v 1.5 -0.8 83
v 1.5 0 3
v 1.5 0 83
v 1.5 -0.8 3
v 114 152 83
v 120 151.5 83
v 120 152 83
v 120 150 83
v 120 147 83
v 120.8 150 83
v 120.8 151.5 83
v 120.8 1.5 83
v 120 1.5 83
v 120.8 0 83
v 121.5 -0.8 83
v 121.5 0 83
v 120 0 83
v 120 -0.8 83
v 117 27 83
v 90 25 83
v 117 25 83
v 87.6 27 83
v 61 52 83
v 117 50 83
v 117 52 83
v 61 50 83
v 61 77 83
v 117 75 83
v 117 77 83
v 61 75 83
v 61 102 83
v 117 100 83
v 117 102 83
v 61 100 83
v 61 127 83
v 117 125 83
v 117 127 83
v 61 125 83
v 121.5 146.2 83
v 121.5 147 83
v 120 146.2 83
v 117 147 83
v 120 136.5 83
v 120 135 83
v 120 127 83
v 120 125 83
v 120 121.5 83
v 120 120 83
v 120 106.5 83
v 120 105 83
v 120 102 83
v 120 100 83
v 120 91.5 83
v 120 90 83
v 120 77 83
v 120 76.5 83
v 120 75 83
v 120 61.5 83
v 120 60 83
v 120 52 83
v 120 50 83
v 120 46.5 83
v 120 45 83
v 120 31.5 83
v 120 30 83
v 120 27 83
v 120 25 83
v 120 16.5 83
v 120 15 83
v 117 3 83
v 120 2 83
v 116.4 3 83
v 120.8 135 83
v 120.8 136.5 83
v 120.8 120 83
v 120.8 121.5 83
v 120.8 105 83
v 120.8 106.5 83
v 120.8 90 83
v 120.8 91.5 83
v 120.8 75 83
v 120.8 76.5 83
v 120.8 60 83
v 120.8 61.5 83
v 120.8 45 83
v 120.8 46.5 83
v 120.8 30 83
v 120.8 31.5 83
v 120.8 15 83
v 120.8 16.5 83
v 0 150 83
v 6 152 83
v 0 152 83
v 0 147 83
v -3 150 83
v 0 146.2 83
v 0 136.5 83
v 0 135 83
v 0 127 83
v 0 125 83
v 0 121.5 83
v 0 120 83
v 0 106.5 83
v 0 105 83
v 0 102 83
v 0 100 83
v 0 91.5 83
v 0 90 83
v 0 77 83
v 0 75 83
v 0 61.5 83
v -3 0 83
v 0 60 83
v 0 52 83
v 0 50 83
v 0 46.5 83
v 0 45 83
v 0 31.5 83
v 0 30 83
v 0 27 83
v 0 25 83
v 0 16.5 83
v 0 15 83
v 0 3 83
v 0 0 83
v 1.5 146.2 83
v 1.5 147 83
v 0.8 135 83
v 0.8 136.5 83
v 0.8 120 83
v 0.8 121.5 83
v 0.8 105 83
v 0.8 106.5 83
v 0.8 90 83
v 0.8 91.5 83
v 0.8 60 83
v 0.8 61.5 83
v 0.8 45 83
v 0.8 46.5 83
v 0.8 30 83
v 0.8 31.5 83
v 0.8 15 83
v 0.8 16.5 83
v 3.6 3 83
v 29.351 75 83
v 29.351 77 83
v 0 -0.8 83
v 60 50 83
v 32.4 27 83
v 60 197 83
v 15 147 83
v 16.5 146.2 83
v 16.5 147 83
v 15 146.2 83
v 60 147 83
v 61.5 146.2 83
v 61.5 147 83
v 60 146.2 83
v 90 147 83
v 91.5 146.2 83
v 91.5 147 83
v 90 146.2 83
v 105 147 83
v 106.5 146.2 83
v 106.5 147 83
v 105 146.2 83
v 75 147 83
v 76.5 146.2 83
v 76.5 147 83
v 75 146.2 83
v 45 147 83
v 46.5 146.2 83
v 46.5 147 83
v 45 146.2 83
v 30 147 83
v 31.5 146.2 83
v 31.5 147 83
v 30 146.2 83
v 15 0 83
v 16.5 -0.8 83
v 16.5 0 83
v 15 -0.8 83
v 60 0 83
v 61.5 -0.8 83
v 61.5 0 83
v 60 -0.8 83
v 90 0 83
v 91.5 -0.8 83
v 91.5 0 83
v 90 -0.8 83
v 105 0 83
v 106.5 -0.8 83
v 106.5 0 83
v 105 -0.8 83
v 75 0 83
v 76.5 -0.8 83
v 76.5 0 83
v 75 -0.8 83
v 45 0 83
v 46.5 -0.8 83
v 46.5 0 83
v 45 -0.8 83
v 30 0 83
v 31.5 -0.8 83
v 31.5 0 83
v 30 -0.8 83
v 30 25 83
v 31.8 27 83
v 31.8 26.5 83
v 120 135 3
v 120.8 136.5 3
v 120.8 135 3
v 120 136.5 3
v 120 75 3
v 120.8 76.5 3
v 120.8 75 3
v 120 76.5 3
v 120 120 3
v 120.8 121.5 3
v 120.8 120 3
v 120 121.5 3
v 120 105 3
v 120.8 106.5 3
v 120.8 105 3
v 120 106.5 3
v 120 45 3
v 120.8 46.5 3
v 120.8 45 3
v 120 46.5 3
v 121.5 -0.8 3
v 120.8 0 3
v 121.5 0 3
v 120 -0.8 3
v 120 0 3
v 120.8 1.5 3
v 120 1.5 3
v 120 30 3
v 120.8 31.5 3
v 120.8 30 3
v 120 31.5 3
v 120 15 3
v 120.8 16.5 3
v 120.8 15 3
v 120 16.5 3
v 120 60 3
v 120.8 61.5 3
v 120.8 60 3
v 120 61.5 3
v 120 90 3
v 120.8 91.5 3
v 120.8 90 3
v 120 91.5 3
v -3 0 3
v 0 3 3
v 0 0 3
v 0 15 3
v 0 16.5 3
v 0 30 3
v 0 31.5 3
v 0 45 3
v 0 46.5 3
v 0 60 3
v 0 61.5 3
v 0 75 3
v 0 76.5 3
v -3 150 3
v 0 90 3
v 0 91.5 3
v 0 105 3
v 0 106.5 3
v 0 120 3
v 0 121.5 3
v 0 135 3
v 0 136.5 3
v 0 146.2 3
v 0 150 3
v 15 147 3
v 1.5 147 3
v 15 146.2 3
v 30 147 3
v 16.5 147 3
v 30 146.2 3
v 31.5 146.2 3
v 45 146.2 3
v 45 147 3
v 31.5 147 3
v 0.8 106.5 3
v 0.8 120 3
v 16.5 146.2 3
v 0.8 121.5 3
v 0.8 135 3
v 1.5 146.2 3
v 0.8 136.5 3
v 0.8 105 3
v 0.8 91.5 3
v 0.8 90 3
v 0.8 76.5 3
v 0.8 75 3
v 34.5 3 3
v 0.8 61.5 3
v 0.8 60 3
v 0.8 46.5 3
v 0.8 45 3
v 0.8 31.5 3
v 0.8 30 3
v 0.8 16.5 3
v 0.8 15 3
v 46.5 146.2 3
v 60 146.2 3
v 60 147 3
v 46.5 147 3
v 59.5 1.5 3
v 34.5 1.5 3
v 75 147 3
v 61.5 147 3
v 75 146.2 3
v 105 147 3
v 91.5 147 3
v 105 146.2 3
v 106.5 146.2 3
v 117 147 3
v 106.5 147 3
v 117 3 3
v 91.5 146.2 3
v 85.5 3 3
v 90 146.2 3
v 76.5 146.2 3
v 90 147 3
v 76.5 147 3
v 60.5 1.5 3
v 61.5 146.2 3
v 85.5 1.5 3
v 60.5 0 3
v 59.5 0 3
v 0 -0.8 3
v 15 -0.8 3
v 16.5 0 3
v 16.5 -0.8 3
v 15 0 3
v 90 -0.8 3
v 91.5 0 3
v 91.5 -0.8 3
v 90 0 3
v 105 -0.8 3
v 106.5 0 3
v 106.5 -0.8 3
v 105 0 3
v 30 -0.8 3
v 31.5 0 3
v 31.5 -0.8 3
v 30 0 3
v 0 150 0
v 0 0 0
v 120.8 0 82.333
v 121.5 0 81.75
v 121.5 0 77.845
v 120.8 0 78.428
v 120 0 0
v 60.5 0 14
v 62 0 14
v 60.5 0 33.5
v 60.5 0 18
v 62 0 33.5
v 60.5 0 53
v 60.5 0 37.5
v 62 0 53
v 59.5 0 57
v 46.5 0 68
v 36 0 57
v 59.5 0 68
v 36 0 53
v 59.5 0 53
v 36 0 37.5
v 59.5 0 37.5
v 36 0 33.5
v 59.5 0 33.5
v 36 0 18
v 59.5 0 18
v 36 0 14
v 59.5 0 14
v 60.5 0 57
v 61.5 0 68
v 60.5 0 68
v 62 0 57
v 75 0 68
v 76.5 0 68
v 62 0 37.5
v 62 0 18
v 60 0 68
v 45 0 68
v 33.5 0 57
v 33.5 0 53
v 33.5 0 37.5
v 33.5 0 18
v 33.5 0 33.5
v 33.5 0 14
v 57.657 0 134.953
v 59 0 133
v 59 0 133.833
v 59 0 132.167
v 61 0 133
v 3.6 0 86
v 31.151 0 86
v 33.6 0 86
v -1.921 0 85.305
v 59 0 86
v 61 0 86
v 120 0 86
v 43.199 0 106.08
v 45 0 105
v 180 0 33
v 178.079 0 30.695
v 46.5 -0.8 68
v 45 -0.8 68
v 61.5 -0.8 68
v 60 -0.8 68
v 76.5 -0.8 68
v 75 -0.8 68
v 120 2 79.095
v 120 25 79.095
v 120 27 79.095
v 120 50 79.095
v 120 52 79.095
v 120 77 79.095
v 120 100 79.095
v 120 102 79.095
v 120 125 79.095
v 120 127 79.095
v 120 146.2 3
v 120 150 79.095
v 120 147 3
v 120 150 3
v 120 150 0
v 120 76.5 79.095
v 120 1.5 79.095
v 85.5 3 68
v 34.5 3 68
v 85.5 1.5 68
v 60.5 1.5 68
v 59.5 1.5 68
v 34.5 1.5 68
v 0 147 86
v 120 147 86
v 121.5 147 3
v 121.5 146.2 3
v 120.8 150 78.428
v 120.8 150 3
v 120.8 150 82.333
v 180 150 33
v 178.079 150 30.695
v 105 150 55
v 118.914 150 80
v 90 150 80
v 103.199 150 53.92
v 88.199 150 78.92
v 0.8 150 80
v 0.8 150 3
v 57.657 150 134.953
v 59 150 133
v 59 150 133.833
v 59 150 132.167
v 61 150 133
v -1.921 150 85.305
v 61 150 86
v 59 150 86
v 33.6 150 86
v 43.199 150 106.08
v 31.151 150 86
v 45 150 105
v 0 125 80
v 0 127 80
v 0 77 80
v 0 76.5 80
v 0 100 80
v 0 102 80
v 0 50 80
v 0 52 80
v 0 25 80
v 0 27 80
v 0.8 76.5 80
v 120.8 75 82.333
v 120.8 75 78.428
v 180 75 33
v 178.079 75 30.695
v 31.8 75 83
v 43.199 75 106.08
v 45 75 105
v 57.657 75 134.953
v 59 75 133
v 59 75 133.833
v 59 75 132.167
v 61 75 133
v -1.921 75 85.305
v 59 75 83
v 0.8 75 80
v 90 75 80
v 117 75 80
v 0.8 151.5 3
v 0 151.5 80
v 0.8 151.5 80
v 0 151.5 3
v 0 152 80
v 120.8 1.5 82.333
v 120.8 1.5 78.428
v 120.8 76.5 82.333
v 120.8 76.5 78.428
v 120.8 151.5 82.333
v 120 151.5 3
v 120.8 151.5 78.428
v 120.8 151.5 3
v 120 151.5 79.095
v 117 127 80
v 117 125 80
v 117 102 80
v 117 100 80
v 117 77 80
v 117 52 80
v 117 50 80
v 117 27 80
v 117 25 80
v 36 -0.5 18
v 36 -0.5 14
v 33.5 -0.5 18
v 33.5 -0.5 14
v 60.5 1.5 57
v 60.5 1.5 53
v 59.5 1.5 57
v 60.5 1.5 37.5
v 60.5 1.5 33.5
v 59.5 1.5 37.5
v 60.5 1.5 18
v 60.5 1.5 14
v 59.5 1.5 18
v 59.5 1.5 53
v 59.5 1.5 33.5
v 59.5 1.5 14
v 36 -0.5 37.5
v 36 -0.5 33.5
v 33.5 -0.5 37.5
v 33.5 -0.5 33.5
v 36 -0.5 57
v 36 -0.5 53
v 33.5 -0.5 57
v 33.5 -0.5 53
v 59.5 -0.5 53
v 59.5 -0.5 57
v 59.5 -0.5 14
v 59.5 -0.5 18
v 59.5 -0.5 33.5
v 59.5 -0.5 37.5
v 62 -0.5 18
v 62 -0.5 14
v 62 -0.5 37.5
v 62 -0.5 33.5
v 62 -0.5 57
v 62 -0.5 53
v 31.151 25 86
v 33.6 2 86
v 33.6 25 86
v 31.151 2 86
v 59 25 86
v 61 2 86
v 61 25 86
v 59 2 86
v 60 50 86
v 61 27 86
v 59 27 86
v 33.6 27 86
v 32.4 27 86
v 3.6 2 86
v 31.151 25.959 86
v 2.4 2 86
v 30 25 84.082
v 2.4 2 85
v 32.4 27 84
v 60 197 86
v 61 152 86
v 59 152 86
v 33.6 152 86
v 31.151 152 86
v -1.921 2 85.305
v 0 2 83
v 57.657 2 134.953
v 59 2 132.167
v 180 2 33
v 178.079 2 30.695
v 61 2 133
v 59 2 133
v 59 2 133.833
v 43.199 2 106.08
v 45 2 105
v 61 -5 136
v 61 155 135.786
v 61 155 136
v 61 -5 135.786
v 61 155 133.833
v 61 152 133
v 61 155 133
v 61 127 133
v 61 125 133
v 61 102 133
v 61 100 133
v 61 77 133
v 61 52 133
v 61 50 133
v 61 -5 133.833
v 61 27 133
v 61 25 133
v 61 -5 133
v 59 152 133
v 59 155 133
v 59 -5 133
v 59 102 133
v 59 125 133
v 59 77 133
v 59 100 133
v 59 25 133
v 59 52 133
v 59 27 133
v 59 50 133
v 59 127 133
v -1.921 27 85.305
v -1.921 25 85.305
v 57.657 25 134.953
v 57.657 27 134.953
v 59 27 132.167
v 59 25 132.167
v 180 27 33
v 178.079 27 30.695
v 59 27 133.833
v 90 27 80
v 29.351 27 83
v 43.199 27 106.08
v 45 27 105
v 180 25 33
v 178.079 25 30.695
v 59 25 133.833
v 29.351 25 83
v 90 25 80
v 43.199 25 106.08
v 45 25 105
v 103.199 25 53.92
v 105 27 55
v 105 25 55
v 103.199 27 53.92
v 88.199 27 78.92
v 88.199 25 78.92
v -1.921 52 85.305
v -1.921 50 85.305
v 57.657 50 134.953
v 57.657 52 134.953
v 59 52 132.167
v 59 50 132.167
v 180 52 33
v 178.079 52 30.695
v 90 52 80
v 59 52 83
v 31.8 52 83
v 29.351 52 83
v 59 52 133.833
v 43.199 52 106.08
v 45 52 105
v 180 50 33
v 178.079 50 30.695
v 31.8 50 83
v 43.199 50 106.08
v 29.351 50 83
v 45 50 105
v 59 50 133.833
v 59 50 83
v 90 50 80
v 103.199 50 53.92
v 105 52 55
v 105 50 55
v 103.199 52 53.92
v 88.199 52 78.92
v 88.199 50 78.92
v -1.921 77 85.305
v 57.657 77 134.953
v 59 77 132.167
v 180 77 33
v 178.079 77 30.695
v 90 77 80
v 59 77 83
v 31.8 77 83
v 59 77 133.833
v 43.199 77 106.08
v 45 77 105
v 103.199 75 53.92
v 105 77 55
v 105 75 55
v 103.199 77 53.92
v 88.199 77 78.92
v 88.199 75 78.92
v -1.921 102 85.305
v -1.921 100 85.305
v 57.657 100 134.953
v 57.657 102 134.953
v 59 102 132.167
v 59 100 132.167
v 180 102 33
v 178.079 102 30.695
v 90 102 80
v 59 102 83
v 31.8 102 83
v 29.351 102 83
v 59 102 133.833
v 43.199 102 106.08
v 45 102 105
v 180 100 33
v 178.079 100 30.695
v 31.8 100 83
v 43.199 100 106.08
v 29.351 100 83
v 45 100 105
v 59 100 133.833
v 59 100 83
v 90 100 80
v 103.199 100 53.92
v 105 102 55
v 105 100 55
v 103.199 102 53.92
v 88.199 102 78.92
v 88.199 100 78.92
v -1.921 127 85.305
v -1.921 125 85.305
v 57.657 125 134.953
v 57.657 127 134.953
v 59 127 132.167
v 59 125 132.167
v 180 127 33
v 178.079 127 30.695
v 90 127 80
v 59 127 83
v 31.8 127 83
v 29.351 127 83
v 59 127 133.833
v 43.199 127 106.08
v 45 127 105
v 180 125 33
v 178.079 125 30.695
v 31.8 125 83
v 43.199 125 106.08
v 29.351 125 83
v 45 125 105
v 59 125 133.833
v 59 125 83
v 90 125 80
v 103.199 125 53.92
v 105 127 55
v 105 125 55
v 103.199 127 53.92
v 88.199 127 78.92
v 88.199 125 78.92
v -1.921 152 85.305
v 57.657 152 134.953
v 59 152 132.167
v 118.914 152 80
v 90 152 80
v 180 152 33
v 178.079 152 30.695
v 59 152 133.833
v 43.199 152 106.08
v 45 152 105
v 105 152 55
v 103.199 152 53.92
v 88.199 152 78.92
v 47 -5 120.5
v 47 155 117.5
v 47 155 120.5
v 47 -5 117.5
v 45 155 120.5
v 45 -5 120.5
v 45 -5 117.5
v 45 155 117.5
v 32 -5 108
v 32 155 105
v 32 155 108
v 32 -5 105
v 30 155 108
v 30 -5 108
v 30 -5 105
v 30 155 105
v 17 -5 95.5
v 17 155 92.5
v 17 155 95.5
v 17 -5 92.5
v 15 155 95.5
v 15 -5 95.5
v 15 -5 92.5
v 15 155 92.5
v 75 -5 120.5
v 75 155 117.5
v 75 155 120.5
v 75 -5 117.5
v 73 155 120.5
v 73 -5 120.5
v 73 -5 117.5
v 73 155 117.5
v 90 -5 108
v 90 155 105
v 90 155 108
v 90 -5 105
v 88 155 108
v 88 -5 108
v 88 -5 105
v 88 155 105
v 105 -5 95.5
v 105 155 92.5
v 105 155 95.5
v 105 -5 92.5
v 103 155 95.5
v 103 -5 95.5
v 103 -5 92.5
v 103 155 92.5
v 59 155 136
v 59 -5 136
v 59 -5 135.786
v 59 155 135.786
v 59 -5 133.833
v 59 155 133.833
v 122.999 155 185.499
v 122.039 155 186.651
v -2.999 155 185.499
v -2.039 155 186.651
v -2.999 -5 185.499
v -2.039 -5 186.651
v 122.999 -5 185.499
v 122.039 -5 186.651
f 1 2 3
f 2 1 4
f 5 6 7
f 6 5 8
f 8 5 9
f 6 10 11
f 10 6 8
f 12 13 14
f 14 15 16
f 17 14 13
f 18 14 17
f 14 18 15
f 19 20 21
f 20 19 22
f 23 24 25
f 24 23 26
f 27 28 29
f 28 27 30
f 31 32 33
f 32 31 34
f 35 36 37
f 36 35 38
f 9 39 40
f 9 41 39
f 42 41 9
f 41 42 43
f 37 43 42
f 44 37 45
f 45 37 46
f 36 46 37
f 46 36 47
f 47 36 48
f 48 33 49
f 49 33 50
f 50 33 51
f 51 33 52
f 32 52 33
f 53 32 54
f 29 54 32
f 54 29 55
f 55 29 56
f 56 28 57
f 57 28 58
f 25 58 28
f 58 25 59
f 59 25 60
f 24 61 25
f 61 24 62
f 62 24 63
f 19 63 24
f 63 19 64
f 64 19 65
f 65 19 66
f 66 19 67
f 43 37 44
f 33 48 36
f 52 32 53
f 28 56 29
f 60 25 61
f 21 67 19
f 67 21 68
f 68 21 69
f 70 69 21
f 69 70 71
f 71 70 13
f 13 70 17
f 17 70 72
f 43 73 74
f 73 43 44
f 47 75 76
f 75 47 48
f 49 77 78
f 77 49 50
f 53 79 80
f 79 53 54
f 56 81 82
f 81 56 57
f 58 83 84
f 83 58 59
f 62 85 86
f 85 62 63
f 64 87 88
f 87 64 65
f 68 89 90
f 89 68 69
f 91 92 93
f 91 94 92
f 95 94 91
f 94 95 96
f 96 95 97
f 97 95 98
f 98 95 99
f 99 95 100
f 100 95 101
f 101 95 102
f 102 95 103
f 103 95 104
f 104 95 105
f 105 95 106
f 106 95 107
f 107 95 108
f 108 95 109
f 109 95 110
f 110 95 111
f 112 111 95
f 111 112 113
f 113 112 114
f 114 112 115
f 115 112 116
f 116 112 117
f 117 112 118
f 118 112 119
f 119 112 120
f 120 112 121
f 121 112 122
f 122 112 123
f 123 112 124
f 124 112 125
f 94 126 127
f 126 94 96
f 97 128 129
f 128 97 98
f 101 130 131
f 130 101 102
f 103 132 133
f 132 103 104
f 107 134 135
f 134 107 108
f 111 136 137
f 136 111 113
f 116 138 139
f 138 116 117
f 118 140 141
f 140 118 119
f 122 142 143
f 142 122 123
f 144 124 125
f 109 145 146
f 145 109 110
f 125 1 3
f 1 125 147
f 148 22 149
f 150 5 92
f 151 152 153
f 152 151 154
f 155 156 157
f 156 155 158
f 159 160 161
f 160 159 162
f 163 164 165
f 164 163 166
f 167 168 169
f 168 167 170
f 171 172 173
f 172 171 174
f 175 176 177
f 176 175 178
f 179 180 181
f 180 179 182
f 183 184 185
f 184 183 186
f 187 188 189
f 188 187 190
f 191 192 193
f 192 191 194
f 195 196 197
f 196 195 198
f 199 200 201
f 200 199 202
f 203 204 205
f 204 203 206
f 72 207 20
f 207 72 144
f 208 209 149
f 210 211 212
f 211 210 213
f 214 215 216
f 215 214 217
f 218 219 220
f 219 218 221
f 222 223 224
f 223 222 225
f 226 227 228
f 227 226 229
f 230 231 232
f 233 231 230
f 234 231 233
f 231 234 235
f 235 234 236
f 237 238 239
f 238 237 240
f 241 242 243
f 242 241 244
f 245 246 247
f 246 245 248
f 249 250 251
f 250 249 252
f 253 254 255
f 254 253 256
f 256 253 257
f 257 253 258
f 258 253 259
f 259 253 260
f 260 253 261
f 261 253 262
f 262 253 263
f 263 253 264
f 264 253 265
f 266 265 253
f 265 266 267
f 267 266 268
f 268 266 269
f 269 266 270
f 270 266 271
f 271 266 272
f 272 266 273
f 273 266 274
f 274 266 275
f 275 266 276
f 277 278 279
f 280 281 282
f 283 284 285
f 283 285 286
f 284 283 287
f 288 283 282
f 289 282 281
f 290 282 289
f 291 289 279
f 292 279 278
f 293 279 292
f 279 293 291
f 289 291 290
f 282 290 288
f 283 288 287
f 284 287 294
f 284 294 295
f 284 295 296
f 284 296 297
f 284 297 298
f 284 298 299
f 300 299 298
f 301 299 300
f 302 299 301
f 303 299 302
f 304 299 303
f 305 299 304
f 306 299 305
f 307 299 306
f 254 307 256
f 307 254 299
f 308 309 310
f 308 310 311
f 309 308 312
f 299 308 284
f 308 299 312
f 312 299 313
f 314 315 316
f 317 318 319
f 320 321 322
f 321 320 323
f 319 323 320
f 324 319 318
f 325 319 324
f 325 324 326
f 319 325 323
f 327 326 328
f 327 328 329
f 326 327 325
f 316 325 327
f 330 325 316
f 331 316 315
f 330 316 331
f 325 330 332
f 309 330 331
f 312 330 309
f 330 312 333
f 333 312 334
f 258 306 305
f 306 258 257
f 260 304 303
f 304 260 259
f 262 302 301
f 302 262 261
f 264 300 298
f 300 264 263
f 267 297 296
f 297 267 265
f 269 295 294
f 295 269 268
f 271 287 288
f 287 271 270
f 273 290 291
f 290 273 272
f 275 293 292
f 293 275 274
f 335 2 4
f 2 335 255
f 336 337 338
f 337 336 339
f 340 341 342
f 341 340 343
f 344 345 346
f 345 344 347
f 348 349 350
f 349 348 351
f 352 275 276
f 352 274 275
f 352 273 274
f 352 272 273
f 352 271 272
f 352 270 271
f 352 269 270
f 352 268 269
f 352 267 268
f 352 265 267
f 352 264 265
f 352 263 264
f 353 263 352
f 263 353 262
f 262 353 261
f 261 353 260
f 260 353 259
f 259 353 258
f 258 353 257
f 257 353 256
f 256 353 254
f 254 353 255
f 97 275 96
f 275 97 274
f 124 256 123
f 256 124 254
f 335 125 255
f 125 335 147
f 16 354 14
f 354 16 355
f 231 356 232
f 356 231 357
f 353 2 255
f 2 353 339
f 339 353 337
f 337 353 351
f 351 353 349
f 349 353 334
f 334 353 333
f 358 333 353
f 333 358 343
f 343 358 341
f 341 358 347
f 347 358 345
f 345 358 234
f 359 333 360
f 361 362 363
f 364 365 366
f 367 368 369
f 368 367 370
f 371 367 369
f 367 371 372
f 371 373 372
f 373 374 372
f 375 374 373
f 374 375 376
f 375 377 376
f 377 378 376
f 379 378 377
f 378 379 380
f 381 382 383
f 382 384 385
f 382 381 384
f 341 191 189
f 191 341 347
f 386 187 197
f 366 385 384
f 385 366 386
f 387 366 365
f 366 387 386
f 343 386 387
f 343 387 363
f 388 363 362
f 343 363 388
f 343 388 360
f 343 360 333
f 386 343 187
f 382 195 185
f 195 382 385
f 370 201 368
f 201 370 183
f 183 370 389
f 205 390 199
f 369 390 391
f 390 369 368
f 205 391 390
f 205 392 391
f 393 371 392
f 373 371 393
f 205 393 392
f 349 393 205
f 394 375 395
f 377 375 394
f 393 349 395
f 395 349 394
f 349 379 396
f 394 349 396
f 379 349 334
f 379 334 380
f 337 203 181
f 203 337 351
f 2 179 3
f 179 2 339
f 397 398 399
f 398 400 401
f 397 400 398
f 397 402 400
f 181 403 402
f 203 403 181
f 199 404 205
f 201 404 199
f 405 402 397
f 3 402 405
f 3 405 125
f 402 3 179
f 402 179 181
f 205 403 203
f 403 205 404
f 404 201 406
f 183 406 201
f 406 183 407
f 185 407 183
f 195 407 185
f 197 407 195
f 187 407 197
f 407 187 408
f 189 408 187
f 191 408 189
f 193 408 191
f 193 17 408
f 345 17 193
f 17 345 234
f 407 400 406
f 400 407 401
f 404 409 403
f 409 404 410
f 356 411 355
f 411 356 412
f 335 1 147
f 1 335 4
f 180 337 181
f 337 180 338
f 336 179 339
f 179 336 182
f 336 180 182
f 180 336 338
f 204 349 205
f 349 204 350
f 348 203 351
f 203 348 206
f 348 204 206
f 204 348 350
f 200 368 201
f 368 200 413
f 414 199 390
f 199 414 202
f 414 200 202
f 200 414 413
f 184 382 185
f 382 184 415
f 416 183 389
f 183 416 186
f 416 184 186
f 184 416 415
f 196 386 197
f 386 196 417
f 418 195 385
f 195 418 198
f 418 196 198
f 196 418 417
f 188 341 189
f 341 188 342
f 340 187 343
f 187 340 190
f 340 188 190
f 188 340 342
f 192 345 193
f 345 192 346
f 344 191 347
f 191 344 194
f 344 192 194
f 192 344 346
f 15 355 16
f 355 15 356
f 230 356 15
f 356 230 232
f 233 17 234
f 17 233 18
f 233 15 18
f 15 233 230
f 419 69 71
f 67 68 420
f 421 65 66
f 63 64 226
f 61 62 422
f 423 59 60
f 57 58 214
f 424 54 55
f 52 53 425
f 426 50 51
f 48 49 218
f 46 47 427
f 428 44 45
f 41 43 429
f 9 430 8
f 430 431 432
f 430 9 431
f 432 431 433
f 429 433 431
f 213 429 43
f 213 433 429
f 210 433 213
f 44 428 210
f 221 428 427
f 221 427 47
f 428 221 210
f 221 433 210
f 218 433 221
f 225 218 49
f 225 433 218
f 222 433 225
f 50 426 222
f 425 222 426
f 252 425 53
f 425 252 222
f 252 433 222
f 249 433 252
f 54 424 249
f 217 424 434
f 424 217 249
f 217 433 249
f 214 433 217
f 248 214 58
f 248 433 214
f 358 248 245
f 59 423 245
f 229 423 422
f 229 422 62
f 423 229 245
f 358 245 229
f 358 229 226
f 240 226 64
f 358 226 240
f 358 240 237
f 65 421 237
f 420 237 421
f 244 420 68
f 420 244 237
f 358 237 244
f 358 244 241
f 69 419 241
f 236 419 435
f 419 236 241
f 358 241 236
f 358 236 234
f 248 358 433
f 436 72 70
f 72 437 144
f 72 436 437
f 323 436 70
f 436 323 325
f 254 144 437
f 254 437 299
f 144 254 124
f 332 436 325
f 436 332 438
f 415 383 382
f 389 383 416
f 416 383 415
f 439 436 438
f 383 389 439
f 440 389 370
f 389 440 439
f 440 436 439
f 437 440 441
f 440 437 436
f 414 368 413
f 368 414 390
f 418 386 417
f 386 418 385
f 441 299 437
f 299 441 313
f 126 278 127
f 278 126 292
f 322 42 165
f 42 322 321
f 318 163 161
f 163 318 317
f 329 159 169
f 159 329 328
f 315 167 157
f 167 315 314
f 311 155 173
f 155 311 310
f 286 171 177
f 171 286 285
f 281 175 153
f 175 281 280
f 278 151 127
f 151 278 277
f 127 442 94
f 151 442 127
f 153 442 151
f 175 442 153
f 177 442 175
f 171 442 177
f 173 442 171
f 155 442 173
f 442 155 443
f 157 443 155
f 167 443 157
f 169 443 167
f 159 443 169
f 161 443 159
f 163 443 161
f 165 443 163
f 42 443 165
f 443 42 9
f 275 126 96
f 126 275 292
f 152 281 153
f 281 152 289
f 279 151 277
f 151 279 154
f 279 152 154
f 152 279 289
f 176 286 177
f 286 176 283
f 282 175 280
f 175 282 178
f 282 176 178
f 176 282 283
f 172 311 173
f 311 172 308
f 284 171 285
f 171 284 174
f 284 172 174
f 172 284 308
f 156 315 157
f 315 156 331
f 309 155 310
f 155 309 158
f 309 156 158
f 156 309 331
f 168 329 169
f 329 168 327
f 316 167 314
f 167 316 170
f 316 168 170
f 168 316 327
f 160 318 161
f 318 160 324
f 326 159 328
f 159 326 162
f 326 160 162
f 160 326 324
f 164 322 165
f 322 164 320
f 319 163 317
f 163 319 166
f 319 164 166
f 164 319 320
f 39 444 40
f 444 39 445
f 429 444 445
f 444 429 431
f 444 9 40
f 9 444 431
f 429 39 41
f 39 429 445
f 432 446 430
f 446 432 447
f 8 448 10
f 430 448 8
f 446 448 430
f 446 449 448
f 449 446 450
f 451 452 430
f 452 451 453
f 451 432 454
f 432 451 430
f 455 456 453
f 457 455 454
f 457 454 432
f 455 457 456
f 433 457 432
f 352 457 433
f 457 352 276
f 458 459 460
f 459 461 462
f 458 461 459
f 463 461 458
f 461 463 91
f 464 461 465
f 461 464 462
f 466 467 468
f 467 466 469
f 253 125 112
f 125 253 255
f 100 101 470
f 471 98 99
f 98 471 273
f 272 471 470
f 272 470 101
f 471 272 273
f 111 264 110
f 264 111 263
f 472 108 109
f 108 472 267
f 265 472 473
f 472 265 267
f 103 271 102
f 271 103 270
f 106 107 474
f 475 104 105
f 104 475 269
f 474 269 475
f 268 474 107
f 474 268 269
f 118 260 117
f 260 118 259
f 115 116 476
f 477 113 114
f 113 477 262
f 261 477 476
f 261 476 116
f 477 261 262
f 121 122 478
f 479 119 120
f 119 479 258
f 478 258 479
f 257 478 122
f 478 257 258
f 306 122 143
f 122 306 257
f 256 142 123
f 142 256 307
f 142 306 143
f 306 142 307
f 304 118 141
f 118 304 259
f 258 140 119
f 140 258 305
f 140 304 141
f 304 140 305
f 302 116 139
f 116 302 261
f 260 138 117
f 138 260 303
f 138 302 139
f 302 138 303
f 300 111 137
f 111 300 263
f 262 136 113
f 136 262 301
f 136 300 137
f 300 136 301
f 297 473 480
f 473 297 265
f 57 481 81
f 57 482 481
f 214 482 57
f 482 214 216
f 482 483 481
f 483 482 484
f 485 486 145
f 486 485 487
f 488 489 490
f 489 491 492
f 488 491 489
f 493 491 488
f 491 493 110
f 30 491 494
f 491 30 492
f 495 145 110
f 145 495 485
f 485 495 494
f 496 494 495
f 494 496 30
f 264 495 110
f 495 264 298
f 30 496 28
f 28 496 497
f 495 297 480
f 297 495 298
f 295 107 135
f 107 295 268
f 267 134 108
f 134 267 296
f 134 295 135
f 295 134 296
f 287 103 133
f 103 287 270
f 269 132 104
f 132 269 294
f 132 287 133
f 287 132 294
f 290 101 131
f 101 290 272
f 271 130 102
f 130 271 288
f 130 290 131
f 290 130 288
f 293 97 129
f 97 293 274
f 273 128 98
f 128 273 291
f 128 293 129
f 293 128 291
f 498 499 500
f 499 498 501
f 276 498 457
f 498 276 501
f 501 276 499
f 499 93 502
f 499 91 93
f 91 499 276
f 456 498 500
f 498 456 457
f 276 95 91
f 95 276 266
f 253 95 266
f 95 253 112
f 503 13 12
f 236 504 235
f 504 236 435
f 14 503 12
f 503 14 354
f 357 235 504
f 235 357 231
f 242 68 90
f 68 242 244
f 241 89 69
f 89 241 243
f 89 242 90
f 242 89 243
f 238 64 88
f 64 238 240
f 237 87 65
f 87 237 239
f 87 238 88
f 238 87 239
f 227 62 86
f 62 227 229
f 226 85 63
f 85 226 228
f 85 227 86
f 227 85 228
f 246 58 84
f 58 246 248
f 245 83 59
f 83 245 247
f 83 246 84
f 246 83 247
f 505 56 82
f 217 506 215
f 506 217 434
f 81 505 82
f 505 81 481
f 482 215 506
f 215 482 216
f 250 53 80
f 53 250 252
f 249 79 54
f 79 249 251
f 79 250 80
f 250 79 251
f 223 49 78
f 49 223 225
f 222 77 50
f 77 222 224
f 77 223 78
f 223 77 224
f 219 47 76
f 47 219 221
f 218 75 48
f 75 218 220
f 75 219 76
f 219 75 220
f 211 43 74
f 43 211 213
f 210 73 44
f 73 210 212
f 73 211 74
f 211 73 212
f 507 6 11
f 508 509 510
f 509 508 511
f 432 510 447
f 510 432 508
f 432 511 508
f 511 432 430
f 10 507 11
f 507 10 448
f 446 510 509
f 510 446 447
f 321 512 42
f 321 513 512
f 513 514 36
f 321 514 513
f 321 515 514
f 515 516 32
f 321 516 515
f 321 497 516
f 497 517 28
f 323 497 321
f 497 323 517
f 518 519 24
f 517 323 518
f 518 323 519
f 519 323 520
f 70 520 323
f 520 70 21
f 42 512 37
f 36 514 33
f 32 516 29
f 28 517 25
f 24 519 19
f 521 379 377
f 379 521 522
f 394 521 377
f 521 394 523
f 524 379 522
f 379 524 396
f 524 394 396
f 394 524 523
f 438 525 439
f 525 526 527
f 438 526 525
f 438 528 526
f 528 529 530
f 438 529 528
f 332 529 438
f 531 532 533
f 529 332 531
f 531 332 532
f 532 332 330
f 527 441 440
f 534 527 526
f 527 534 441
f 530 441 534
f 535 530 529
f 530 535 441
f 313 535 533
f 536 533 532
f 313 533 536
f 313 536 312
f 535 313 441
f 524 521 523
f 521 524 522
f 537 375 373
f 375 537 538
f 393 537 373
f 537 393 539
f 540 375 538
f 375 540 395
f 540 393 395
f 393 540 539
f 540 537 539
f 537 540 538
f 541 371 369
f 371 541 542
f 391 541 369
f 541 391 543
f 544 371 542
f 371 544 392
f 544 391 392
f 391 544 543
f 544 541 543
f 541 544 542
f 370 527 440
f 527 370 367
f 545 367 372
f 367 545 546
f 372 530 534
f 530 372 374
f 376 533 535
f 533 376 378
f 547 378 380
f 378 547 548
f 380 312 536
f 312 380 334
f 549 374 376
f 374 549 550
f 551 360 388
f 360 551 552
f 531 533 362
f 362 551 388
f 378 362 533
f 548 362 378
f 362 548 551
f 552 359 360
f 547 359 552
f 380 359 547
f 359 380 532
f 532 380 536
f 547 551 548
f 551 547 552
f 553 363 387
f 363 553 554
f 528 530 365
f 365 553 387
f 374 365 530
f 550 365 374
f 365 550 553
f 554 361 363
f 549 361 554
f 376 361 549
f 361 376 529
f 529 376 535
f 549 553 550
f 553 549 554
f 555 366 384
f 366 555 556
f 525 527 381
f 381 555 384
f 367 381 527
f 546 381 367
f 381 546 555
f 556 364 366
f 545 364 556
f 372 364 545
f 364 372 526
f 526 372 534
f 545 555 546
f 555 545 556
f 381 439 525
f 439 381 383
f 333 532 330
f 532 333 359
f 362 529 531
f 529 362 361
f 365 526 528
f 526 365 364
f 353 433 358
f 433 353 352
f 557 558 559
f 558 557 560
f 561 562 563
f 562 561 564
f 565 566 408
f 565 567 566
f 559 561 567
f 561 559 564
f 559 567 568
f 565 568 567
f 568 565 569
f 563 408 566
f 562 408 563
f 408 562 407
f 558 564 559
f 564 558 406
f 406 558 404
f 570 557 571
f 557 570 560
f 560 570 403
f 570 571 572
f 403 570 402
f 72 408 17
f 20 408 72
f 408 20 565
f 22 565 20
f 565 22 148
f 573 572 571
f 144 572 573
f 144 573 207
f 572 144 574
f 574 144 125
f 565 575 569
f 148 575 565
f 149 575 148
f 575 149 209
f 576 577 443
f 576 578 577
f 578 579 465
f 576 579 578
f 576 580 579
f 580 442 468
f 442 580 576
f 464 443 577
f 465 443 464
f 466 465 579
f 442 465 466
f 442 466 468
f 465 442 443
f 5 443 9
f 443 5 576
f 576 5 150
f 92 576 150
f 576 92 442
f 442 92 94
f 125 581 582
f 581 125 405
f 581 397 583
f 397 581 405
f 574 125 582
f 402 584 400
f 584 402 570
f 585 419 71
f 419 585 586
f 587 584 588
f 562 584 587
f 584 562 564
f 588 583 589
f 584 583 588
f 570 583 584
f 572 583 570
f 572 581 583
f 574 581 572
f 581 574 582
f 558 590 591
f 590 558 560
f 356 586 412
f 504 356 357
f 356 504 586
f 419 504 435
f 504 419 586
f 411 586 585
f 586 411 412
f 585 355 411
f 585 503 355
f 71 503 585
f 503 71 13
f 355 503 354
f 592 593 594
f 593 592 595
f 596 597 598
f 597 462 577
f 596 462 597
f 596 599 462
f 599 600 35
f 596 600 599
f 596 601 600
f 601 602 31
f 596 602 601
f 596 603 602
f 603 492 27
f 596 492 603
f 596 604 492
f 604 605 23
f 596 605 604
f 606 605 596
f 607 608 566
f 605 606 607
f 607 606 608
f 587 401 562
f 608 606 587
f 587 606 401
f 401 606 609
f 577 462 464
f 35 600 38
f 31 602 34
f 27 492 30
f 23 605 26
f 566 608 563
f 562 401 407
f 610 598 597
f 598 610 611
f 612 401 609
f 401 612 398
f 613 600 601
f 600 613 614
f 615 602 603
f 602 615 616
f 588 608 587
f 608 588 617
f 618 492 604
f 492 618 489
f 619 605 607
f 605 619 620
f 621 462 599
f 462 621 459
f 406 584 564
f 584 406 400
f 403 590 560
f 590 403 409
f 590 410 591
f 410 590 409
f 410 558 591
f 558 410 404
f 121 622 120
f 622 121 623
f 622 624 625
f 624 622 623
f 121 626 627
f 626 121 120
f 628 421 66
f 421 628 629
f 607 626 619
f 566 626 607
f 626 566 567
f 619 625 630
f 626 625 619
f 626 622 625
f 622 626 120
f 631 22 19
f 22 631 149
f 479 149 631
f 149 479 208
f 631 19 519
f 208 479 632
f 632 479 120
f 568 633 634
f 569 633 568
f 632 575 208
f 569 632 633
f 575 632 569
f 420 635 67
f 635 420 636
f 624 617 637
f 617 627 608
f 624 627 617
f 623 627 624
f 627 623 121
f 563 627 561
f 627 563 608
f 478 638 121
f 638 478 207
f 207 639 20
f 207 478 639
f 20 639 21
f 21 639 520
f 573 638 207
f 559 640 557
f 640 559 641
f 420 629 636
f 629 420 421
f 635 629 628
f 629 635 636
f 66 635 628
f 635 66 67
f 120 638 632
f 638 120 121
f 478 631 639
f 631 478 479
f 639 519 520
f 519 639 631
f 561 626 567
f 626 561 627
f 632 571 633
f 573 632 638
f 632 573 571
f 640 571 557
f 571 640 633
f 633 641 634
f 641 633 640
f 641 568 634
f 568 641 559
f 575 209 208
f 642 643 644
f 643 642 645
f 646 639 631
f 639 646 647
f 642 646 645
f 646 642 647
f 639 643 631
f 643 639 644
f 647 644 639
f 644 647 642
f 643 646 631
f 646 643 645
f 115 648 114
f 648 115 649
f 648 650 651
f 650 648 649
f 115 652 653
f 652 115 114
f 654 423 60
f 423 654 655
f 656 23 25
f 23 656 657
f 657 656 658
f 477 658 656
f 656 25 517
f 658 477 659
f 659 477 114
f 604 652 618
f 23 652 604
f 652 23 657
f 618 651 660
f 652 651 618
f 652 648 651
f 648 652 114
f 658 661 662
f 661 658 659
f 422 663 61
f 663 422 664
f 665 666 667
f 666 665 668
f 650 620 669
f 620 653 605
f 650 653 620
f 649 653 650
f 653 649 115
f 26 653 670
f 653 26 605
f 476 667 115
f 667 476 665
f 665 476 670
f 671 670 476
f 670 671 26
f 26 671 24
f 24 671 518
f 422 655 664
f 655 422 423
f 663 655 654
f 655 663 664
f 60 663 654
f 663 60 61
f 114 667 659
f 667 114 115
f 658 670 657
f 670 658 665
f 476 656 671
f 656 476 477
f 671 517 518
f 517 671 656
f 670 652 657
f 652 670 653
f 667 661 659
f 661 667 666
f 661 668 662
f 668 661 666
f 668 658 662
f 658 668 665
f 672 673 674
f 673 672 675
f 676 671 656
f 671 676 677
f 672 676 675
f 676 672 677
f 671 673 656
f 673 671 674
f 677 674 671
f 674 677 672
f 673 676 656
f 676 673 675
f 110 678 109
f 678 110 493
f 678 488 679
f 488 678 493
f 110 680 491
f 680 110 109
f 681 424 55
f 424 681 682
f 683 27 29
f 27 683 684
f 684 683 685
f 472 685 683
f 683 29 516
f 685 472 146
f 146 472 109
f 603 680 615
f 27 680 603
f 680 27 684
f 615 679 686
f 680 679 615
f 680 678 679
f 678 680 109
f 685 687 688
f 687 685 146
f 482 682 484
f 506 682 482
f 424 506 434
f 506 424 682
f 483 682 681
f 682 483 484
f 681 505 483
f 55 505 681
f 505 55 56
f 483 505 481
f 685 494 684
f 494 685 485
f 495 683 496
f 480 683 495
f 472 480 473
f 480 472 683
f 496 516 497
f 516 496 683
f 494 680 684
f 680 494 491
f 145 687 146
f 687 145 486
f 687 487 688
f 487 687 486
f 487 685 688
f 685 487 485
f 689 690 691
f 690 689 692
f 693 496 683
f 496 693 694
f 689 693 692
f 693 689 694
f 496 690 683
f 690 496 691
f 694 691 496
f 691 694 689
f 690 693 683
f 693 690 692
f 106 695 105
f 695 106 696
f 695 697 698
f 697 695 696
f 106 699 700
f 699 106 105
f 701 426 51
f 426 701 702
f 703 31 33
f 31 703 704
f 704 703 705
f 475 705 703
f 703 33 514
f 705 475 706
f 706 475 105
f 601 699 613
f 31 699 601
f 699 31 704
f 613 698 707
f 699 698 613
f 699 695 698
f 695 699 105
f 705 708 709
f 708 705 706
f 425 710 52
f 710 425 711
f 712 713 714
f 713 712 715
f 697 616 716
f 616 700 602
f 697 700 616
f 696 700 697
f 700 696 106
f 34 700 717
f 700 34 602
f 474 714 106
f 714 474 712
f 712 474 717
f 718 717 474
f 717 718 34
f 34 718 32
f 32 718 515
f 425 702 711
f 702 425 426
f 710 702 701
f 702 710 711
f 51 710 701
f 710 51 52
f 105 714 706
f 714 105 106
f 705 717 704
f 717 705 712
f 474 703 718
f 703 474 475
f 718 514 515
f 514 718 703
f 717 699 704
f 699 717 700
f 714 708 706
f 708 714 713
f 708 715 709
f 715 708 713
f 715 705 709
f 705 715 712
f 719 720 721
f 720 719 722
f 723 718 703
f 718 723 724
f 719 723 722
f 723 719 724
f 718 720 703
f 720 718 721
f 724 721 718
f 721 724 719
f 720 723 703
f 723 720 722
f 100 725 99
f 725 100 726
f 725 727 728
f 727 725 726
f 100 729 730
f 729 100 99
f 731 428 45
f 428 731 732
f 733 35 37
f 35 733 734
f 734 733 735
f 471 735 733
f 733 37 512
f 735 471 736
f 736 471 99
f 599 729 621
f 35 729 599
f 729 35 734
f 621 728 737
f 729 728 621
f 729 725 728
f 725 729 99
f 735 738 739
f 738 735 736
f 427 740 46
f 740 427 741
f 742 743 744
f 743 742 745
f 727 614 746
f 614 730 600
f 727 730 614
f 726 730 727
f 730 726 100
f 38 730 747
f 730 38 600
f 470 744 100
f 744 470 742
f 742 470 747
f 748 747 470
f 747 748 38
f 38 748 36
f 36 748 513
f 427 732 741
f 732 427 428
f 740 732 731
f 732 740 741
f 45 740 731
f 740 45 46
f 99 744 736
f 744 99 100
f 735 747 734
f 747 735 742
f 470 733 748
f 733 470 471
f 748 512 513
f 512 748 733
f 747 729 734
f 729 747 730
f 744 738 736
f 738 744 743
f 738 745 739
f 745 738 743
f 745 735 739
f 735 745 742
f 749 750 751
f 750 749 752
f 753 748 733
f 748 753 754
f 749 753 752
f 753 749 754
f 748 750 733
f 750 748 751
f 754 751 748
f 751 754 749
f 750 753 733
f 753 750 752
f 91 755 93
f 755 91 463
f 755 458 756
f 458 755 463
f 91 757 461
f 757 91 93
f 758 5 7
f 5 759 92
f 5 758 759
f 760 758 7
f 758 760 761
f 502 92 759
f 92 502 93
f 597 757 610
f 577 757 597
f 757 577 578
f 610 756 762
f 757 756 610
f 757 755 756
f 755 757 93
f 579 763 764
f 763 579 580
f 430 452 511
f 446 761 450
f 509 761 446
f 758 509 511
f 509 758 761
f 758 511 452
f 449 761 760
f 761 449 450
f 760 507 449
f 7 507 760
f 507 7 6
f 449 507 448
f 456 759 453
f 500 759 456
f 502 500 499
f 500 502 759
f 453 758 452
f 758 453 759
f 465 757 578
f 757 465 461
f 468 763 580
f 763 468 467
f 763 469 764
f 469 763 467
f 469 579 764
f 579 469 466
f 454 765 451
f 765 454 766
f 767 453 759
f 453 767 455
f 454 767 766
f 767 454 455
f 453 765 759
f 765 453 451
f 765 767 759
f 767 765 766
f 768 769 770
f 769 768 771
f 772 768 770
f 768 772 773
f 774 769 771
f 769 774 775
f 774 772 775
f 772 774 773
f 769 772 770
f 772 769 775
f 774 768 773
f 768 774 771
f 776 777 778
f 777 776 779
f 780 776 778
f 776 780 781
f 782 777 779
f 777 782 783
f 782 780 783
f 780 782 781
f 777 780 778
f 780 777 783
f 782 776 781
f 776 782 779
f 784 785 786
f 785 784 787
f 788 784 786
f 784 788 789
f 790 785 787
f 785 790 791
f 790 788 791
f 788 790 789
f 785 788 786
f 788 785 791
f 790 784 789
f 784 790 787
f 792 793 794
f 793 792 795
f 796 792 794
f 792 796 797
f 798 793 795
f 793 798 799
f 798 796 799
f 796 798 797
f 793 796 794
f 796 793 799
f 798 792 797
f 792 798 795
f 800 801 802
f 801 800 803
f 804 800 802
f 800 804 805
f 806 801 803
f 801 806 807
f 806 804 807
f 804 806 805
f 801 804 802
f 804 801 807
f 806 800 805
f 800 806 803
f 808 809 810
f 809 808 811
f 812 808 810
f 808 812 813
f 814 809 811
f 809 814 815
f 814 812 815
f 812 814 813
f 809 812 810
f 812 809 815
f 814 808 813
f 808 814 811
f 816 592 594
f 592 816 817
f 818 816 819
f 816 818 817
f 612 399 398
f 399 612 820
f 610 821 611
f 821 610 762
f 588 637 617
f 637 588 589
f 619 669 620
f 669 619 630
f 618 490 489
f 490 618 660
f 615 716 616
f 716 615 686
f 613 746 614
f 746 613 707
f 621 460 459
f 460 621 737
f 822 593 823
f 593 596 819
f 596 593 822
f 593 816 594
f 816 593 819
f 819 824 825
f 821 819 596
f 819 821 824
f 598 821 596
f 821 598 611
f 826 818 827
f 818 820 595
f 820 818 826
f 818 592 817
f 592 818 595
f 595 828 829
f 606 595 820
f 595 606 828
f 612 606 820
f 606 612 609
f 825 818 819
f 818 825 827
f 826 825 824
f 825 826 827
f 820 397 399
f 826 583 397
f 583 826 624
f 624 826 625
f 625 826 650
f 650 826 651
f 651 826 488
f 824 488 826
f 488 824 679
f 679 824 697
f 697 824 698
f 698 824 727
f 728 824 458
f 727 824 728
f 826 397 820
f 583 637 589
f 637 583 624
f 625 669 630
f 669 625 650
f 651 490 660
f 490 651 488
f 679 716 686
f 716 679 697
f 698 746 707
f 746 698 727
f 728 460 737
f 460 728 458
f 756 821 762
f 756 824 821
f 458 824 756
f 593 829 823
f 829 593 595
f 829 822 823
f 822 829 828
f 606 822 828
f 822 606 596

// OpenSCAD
// Storage Shed / Barn with Gable Roof and Exposed Trusses
// Dimensions in millimeters (scaled model)

// Main parameters
shed_width = 120;       // Width (side to side)
shed_depth = 150;       // Depth (front to back)
wall_height = 80;       // Wall height to eave
roof_peak_height = 50;  // Height from eave to ridge
wall_thickness = 3;
panel_thickness = 1.5;

// Roof parameters
roof_overhang_side = 5;
roof_overhang_front = 5;
rafter_width = 2;
rafter_height = 3;
num_trusses = 7;

// Door parameters
door_width = 25;
door_height = 65;
door_gap = 1;

// Batten parameters
batten_width = 1.5;
batten_depth = 0.8;
batten_spacing = 15;

$fn = 20;

// Module for a single wall panel with vertical battens
module wall_panel(width, height, thickness) {
    // Base panel
    cube([width, thickness, height]);
    // Vertical battens
    num_battens = floor(width / batten_spacing);
    for (i = [0 : num_battens]) {
        translate([i * batten_spacing, -batten_depth, 0])
            cube([batten_width, batten_depth, height]);
    }
}

// Module for gable wall (triangular top)
module gable_wall(width, wall_h, peak_h, thickness) {
    // Rectangular lower part
    cube([width, thickness, wall_h]);
    // Triangular gable
    translate([0, 0, wall_h])
        linear_extrude(height=thickness)
            rotate([90, 0, 0])
                translate([0, 0, -thickness])
                    linear_extrude(height=thickness)
                        polygon([[0, 0], [width, 0], [width/2, peak_h]]);
}

// Module for roof truss
module roof_truss(width, peak_h) {
    half_w = width / 2;
    rafter_len = sqrt(half_w * half_w + peak_h * peak_h);
    rafter_angle = atan2(peak_h, half_w);
    
    // Left rafter
    translate([0, 0, 0])
        rotate([0, -rafter_angle, 0])
            cube([rafter_len, rafter_width, rafter_height]);
    
    // Right rafter
    translate([width, 0, 0])
        rotate([0, rafter_angle - 180, 0])
            translate([-rafter_len, 0, 0])
                cube([rafter_len, rafter_width, rafter_height]);
    
    // Bottom chord (tie beam)
    translate([0, 0, -rafter_height])
        cube([width, rafter_width, rafter_height]);
    
    // King post
    translate([half_w - rafter_width/2, 0, -rafter_height])
        cube([rafter_width, rafter_width, peak_h + rafter_height]);
    
    // Left diagonal brace
    translate([width*0.25, 0, -rafter_height])
        rotate([0, -atan2(peak_h*0.5, half_w*0.25), 0])
            cube([sqrt((half_w*0.25)*(half_w*0.25) + (peak_h*0.5)*(peak_h*0.5)), rafter_width, rafter_height*0.7]);
    
    // Right diagonal brace
    translate([width*0.75, 0, -rafter_height])
        rotate([0, atan2(peak_h*0.5, half_w*0.25)-180, 0])
            translate([-sqrt((half_w*0.25)*(half_w*0.25) + (peak_h*0.5)*(peak_h*0.5)), 0, 0])
                cube([sqrt((half_w*0.25)*(half_w*0.25) + (peak_h*0.5)*(peak_h*0.5)), rafter_width, rafter_height*0.7]);
}

// Module for door with hinges
module door(width, height, thickness) {
    cube([width, thickness, height]);
    // Hinges
    for (z = [height*0.2, height*0.5, height*0.8]) {
        translate([-1, -0.5, z-2])
            cube([2.5, 2, 4]);
    }
}

// Module for roof panel
module roof_panel(width, depth, thickness) {
    cube([width, depth, thickness]);
}

// ===== MAIN ASSEMBLY =====

color("LightGray") {
    // Floor
    translate([0, 0, 0])
        cube([shed_width, shed_depth, wall_thickness]);
    
    // Front wall with door opening
    difference() {
        translate([0, 0, wall_thickness])
            wall_panel(shed_width, wall_height, wall_thickness);
        // Door opening
        translate([shed_width/2 - door_width - door_gap/2, -1, wall_thickness])
            cube([door_width*2 + door_gap, wall_thickness + 2, door_height]);
    }
    
    // Front gable triangle
    translate([0, 0, wall_height + wall_thickness])
        linear_extrude(height=wall_thickness)
            polygon([[0, 0], [shed_width, 0], [shed_width/2, roof_peak_height]]);
    
    // Back wall
    translate([0, shed_depth - wall_thickness, wall_thickness])
        wall_panel(shed_width, wall_height, wall_thickness);
    
    // Back gable triangle
    translate([0, shed_depth - wall_thickness, wall_height + wall_thickness])
        linear_extrude(height=wall_thickness)
            polygon([[0, 0], [shed_width, 0], [shed_width/2, roof_peak_height]]);
    
    // Left wall
    translate([0, 0, wall_thickness])
        rotate([0, 0, 90])
            wall_panel(shed_depth, wall_height, wall_thickness);
    
    // Right wall
    translate([shed_width, 0, wall_thickness])
        rotate([0, 0, 90])
            wall_panel(shed_depth, wall_height, wall_thickness);
    
    // Doors
    translate([shed_width/2 - door_width - door_gap/2, 0, wall_thickness])
        door(door_width, door_height, panel_thickness);
    translate([shed_width/2 + door_gap/2, 0, wall_thickness])
        door(door_width, door_height, panel_thickness);
}

// Roof structure
color("Gray") {
    roof_angle = atan2(roof_peak_height, shed_width/2);
    half_roof_len = sqrt((shed_width/2 + roof_overhang_side) * (shed_width/2 + roof_overhang_side) + roof_peak_height * roof_peak_height);
    
    // Trusses
    truss_spacing = shed_depth / (num_trusses - 1);
    for (i = [0 : num_trusses - 1]) {
        translate([0, i * truss_spacing, wall_height + wall_thickness])
            roof_truss(shed_width, roof_peak_height);
    }
    
    // Ridge beam
    translate([shed_width/2 - rafter_width/2, -roof_overhang_front, wall_height + wall_thickness + roof_peak_height])
        cube([rafter_width, shed_depth + 2*roof_overhang_front, rafter_height]);
    
    // Roof panels (left side)
    translate([shed_width/2, -roof_overhang_front, wall_height + wall_thickness + roof_peak_height])
        rotate([0, roof_angle, 0])
            translate([-half_roof_len, 0, 0])
                cube([half_roof_len, shed_depth + 2*roof_overhang_front, panel_thickness]);
    
    // Roof panels (right side)  
    translate([shed_width/2, -roof_overhang_front, wall_height + wall_thickness + roof_peak_height])
        rotate([0, -roof_angle, 0])
            cube([half_roof_len, shed_depth + 2*roof_overhang_front, panel_thickness]);
    
    // Purlins (horizontal roof supports)
    for (side = [0, 1]) {
        for (j = [1:3]) {
            px = (shed_width/2) * j / 4;
            pz = roof_peak_height * (1 - j/4);
            if (side == 0) {
                translate([shed_width/2 - px, -roof_overhang_front, wall_height + wall_thickness + pz - rafter_height])
                    cube([rafter_width, shed_depth + 2*roof_overhang_front, rafter_height]);
            } else {
                translate([shed_width/2 + px - rafter_width, -roof_overhang_front, wall_height + wall_thickness + pz - rafter_height])
                    cube([rafter_width, shed_depth + 2*roof_overhang_front, rafter_height]);
            }
        }
    }
}
